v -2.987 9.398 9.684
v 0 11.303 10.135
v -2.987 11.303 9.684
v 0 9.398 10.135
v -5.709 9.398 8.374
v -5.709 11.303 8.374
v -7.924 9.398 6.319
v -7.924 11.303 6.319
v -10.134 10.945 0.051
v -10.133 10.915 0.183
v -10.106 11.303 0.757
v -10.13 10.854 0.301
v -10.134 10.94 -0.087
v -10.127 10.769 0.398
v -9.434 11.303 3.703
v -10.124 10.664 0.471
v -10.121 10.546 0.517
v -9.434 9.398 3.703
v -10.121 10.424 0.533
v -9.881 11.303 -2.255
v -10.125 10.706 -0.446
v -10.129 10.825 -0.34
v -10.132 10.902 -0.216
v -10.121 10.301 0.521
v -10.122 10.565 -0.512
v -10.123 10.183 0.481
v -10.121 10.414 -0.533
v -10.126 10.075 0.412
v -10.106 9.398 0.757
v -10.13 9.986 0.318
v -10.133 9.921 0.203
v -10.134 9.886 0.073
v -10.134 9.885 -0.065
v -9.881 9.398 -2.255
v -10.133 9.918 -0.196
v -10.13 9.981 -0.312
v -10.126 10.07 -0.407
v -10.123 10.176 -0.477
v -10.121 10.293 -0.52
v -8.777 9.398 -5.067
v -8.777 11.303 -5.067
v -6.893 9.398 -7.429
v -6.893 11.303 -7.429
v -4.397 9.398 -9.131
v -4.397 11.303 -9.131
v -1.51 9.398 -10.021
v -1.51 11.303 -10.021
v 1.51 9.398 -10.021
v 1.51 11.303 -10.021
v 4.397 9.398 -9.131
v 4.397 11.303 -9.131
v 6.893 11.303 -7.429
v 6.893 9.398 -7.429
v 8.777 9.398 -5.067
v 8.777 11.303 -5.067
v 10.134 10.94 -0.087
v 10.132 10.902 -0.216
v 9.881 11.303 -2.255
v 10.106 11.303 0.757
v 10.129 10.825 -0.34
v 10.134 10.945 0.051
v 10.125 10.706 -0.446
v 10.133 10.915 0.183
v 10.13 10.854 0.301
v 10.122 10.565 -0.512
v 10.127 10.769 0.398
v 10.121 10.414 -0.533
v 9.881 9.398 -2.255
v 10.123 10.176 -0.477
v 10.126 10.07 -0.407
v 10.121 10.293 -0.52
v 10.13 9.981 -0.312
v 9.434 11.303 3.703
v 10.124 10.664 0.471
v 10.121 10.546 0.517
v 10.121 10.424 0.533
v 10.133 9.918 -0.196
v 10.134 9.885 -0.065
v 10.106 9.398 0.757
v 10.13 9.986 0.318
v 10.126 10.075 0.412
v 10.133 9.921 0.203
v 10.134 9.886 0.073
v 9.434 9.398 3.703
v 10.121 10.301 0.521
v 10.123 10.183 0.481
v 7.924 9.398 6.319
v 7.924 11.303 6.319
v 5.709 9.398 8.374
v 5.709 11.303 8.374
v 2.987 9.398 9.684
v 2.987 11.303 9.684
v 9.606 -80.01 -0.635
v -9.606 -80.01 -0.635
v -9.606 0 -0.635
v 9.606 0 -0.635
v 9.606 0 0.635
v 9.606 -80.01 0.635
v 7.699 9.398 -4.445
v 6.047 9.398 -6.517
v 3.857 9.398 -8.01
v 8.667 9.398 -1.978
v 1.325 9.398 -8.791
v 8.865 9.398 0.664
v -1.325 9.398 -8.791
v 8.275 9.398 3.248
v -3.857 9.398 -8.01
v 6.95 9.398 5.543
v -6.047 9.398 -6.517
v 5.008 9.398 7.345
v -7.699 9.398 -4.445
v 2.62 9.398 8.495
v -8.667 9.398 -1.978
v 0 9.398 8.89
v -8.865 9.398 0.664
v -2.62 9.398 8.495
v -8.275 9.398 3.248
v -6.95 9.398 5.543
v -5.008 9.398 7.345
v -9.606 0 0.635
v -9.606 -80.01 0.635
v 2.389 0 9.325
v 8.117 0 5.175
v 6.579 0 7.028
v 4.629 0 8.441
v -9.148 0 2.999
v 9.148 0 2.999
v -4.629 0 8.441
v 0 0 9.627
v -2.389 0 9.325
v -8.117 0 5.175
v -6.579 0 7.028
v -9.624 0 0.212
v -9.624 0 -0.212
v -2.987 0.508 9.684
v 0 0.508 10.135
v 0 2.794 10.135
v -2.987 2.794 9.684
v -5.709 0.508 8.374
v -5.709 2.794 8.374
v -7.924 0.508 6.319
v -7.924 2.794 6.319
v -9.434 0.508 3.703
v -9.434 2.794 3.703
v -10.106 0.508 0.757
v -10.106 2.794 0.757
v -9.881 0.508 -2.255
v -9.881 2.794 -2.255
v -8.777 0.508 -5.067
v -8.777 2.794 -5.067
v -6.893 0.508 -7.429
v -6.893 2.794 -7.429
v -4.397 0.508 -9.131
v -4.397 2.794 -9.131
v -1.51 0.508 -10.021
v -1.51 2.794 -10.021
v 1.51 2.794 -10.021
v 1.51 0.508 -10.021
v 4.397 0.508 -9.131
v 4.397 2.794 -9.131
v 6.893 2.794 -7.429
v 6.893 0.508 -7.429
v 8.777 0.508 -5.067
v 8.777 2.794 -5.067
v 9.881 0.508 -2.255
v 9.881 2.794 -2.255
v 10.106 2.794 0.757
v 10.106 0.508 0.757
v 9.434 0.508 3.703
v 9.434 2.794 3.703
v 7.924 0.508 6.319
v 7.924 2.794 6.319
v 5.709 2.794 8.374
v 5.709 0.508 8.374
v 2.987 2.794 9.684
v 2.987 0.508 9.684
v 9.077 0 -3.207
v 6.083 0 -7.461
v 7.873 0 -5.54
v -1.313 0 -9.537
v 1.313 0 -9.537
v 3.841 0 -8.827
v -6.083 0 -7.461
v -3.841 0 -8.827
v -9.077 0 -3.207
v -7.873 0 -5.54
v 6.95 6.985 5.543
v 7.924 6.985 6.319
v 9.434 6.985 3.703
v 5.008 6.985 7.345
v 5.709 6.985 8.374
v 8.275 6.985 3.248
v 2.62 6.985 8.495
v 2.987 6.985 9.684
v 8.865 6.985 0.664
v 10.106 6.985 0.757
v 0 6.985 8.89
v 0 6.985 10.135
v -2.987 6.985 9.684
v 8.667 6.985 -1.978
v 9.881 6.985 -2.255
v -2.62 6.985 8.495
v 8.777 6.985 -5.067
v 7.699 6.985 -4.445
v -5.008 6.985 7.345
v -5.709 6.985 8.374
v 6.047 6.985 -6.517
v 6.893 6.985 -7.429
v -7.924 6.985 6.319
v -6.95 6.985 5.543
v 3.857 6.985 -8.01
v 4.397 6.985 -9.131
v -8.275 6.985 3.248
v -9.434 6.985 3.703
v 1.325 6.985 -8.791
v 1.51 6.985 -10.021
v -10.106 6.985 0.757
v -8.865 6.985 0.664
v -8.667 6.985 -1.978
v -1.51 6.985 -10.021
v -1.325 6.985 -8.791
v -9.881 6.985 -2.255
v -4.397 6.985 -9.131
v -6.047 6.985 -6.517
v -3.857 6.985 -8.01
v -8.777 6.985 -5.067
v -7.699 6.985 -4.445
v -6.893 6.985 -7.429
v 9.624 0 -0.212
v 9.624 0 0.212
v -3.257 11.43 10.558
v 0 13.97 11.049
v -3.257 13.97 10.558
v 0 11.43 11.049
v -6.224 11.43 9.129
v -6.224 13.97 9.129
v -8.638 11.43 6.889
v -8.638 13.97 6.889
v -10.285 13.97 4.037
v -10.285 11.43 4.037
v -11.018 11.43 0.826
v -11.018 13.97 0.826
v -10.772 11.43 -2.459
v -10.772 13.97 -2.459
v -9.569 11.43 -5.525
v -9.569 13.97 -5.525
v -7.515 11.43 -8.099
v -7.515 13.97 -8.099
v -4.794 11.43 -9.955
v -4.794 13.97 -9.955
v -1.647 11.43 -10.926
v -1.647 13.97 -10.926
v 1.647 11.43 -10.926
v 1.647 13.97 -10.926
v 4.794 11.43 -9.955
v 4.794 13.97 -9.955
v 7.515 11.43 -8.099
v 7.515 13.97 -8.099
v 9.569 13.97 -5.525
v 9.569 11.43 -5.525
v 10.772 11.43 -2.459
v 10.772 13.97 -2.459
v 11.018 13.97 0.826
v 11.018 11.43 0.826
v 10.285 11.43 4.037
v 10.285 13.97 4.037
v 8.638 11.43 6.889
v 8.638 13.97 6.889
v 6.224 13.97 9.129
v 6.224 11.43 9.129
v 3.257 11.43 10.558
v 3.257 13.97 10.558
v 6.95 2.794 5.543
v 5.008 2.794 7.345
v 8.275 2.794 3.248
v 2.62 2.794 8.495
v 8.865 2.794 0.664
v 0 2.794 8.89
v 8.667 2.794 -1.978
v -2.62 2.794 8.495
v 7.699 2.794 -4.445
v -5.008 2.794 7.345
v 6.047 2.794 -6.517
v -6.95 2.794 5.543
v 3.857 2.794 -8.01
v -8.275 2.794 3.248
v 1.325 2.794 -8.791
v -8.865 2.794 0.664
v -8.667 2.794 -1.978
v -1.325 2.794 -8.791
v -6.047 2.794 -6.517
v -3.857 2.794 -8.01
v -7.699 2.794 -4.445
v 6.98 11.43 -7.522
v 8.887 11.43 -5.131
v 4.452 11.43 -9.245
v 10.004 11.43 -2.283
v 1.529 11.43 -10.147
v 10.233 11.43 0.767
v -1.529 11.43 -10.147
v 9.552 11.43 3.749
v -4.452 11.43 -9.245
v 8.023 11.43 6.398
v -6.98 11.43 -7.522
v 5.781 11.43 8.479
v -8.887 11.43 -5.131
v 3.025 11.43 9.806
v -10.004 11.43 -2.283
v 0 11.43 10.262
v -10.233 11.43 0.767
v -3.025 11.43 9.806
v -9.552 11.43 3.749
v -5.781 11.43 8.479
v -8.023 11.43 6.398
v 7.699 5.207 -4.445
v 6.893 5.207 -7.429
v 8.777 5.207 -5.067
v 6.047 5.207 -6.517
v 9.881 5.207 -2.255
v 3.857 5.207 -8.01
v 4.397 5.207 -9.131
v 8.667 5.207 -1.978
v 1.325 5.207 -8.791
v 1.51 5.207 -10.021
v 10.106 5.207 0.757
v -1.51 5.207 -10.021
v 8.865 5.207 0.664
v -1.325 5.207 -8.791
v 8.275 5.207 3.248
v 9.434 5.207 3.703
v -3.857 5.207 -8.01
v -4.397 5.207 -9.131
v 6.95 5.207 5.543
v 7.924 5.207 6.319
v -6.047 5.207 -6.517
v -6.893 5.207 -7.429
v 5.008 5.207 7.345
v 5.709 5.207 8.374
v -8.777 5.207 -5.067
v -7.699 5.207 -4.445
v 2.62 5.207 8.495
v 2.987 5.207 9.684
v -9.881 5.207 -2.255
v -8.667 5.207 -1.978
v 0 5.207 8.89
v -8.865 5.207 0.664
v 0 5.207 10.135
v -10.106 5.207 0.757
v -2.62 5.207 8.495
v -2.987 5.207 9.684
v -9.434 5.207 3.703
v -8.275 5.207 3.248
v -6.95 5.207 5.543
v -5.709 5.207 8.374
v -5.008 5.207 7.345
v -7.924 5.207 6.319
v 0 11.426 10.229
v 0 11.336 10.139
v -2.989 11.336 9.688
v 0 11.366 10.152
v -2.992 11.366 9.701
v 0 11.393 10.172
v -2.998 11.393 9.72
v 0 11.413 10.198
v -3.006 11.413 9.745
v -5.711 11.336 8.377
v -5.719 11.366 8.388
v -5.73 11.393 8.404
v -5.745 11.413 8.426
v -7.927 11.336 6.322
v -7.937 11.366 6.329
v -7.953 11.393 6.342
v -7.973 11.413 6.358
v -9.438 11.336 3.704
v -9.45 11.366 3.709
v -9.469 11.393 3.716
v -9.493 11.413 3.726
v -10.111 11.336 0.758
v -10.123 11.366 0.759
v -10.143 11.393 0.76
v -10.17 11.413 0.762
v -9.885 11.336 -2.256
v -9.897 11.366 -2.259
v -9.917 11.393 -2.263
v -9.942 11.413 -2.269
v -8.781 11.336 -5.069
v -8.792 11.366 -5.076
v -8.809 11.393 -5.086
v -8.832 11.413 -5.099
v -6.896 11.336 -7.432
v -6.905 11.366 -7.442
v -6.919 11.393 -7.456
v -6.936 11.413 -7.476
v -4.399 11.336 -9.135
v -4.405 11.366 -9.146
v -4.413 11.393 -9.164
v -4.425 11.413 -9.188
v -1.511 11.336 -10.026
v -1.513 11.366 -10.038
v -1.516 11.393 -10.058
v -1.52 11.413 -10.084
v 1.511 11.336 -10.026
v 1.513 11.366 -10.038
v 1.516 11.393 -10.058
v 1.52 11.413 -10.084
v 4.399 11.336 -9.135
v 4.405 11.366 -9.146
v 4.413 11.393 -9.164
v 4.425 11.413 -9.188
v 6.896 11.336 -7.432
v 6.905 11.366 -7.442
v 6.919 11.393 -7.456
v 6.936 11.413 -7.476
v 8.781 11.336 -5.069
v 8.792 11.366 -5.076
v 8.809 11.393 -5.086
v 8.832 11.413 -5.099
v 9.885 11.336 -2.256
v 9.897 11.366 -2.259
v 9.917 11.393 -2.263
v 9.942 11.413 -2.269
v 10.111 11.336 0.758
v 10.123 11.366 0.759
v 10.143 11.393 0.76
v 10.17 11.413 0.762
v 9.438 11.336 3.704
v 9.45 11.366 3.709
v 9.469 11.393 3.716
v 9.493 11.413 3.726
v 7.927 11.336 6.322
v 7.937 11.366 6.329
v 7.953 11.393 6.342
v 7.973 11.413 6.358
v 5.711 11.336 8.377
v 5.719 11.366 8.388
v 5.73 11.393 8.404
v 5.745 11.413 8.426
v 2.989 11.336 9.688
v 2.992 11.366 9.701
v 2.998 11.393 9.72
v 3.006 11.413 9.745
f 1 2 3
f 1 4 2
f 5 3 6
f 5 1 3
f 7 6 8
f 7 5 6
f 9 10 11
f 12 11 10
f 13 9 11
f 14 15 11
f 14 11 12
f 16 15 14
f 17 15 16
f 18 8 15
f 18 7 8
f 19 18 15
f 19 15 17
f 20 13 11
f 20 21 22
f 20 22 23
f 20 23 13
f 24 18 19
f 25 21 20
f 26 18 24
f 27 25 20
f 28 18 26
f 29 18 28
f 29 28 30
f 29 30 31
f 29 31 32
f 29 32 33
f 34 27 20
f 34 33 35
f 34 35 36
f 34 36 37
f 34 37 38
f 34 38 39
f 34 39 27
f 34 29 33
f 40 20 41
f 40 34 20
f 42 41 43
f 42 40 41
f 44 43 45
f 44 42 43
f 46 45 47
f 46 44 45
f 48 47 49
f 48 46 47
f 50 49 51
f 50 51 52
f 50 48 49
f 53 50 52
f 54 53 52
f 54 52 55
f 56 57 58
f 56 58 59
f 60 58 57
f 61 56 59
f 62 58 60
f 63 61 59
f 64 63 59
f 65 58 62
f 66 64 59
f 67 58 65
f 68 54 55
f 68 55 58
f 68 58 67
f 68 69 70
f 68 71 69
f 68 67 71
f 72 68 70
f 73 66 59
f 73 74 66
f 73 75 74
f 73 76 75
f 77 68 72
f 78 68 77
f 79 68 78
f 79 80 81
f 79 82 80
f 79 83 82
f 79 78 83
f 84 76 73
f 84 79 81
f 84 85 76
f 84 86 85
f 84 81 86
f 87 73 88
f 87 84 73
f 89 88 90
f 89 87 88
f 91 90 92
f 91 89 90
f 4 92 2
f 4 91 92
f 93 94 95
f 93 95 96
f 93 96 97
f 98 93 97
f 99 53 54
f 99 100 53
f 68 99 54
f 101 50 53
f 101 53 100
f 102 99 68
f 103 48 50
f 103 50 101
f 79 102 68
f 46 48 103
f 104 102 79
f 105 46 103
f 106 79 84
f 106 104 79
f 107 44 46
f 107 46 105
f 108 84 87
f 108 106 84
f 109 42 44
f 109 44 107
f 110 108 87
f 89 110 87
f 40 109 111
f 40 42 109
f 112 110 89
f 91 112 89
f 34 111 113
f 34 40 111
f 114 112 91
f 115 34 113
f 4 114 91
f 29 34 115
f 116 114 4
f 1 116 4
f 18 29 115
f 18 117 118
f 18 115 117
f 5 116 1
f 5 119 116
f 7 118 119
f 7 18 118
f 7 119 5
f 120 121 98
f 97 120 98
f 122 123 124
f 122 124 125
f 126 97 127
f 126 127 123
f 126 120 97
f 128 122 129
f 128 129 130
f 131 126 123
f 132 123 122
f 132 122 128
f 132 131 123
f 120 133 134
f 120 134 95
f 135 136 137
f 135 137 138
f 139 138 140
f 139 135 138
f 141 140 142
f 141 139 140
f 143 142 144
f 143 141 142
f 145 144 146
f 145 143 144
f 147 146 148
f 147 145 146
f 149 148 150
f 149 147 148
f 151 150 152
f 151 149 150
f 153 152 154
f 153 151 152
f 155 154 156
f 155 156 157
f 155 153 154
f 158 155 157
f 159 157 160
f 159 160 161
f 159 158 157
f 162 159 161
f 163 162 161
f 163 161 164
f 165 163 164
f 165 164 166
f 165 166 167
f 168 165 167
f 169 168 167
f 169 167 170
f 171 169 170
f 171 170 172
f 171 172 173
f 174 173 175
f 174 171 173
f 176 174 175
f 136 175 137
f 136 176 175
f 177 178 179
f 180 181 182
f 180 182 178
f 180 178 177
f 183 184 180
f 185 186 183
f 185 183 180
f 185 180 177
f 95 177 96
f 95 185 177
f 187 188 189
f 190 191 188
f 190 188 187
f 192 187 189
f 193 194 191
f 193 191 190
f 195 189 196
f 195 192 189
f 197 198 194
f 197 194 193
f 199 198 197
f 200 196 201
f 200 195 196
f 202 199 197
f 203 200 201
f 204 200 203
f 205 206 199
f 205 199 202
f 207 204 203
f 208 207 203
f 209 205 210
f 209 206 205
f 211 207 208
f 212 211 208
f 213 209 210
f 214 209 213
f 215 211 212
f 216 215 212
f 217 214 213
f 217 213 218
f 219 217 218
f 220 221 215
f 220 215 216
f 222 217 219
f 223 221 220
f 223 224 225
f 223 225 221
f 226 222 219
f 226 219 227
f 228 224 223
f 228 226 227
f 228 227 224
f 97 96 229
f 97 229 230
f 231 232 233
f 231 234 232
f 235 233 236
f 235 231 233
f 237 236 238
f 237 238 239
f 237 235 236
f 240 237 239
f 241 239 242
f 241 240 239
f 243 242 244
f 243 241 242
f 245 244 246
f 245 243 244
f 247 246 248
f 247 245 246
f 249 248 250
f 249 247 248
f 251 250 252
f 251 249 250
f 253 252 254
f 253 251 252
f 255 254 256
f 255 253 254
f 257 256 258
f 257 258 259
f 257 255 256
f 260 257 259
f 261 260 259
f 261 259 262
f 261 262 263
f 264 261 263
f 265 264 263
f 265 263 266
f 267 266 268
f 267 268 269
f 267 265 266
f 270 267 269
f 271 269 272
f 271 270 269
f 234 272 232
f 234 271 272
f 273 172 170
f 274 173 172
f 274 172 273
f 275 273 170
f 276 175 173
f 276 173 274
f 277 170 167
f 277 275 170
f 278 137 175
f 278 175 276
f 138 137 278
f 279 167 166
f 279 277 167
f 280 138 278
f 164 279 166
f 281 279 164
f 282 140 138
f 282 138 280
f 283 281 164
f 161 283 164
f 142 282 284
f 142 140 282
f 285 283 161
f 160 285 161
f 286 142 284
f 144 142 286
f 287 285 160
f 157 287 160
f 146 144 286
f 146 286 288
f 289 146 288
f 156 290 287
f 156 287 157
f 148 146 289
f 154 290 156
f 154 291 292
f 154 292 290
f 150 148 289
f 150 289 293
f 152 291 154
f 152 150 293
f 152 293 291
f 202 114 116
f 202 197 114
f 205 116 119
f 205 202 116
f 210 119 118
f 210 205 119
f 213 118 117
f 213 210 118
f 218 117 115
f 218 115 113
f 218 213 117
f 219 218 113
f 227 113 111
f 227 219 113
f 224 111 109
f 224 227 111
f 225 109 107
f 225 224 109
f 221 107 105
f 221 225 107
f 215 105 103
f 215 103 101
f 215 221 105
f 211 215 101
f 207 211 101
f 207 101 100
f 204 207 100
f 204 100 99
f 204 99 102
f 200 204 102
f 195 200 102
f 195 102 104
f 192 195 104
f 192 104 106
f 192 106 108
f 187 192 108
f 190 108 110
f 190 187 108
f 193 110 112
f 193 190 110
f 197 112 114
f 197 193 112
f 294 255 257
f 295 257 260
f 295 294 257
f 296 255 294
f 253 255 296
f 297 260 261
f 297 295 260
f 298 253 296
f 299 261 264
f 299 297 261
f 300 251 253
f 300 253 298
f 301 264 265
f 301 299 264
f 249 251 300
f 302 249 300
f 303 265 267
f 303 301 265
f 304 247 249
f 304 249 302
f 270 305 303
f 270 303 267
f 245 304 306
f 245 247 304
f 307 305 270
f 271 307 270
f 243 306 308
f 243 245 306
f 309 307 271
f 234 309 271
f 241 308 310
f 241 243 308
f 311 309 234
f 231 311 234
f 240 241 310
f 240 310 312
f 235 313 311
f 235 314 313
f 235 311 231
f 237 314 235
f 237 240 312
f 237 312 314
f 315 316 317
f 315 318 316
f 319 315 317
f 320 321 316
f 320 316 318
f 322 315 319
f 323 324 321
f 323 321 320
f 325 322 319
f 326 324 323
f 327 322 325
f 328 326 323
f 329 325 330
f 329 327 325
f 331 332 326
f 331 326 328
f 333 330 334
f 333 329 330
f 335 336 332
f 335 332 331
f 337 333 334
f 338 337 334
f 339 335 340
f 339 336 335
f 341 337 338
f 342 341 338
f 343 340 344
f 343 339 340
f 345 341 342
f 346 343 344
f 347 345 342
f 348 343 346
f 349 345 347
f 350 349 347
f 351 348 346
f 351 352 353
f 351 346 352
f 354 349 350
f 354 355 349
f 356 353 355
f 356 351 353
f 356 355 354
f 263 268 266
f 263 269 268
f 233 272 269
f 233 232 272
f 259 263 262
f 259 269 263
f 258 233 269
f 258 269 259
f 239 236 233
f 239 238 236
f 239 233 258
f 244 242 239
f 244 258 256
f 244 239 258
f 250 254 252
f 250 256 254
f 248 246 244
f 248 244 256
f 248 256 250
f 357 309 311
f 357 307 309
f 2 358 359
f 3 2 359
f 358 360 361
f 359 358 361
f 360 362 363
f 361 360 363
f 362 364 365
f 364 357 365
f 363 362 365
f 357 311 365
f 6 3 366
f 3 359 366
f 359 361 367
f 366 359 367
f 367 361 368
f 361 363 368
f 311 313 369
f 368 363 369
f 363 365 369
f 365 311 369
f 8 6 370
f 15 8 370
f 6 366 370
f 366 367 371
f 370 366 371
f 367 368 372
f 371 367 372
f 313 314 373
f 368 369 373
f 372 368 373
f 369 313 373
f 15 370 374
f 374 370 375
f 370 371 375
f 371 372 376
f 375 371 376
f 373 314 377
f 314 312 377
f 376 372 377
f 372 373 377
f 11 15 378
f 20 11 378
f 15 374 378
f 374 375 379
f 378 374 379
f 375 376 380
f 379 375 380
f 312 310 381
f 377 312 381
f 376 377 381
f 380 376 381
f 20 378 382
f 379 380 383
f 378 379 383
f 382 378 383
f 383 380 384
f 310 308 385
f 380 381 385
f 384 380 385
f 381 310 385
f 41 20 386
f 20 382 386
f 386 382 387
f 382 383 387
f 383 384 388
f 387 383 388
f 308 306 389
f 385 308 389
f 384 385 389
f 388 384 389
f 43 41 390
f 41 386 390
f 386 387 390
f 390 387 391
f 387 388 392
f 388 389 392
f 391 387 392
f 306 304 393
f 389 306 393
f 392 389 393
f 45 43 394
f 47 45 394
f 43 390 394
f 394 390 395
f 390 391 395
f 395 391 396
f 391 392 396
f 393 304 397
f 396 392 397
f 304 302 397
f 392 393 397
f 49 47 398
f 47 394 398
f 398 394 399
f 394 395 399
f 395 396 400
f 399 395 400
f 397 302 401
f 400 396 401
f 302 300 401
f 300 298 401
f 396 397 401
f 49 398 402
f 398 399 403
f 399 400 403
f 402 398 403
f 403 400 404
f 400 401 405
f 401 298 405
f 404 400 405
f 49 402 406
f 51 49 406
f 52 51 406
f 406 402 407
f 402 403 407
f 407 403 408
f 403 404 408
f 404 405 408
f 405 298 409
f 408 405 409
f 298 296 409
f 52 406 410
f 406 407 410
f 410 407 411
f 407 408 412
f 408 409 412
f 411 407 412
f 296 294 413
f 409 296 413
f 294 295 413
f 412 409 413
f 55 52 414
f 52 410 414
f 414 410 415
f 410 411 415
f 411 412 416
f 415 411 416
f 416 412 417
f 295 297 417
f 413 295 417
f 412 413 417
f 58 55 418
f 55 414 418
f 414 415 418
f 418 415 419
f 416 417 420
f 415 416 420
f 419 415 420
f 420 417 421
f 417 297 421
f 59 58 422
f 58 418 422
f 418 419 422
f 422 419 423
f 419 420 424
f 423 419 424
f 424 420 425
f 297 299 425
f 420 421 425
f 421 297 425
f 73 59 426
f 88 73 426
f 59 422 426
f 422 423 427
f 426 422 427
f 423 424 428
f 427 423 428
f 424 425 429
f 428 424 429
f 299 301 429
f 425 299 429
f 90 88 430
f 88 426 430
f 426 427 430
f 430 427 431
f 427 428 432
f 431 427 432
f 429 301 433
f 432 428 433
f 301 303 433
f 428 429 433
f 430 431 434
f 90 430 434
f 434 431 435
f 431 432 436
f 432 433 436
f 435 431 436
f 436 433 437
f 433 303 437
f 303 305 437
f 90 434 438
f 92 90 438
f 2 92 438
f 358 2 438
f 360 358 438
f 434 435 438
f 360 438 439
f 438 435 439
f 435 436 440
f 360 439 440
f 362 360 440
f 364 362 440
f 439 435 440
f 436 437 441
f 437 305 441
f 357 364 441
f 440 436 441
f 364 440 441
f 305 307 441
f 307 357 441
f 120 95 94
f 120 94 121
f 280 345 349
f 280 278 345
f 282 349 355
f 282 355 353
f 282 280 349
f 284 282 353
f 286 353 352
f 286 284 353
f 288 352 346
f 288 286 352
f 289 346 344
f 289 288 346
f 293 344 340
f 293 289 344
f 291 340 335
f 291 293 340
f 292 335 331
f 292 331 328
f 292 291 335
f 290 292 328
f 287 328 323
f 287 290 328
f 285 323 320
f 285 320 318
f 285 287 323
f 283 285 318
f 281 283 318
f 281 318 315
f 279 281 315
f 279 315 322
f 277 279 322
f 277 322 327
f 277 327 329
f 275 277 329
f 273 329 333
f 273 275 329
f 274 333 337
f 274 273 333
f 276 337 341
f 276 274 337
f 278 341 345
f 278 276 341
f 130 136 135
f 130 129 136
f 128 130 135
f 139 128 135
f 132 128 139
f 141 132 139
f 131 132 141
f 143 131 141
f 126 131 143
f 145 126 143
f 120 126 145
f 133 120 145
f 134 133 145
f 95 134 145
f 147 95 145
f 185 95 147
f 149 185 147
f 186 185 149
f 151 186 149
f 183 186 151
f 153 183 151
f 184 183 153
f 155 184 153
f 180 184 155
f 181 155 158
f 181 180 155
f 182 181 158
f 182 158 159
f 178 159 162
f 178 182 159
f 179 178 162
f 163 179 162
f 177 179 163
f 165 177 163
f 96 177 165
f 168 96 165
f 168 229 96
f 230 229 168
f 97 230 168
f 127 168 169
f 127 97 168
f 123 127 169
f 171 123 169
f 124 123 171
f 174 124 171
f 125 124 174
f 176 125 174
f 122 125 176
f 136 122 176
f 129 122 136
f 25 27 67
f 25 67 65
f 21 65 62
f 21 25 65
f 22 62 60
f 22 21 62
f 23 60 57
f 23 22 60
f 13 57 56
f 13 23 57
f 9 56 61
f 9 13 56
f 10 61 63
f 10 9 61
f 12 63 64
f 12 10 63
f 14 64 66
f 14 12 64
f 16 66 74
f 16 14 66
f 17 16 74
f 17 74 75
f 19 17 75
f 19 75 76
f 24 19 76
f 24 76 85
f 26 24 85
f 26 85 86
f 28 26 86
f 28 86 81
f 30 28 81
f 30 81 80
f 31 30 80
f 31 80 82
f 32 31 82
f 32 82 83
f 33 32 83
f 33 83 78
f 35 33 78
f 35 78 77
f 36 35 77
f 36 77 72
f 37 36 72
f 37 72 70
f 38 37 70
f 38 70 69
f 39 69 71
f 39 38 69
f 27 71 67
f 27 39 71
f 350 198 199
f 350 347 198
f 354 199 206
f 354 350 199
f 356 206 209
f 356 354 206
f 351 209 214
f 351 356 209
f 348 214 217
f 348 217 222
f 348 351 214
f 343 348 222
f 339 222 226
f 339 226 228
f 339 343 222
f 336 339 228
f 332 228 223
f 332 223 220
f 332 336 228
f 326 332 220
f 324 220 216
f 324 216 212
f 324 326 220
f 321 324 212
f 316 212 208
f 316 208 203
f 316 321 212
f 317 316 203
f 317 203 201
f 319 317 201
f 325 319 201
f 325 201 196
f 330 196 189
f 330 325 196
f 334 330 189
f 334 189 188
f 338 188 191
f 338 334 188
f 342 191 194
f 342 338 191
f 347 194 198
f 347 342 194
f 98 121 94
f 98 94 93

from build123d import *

# Parameters (mm, degrees)
CHAMFER1_SIZE           = 0.508
SKETCH2_W               = 19.211267794
SKETCH2_H               = 1.27
BOSS_EXTRUDE1_DEPTH     = 80.01
FILLET1_R               = 0.127
CUT_EXTRUDE1_DEPTH      = 82.521536431
CUT_EXTRUDE1_DEPTH_BACK = 82.521536431
SKETCH3_R               = 0.5334


with BuildPart() as part:
    # Sketch1 → Revolve1 (revolve)
    with BuildSketch(Plane.XY, mode=Mode.PRIVATE) as revolve1_sk:
        Polygon((0, 13.97), (-11.049, 13.97), (-11.049, 11.43), (-10.1346, 11.43), (-10.1346, 9.398), (-8.89, 9.398), (-8.89, 6.985), (-10.1346, 6.985), (-10.1346, 5.207), (-8.89, 5.207), (-8.89, 2.794), (-10.1346, 2.794), (-10.1346, 0), (0, 0), align=None)
    revolve(revolve1_sk.sketch.rotate(Axis((0, 20.368840099, 0), (0, -1, 0)), 270), axis=Axis((0, 20.368840099, 0), (0, -1, 0)))

    # Chamfer1
    chamfer1_edges = [part.edges().sort_by_distance(p)[0] for p in [
        (0, 0, -10.1346),
    ]]
    chamfer(chamfer1_edges, length=CHAMFER1_SIZE)

    # Sketch2 → Boss-Extrude1 (add)
    with BuildSketch(Plane.XZ):
        Rectangle(SKETCH2_W, SKETCH2_H)
    extrude(amount=BOSS_EXTRUDE1_DEPTH)

    # Fillet1
    fillet1_edges = [part.edges().sort_by_distance(p)[0] for p in [
        (0, 11.43, -10.1346),
    ]]
    fillet(fillet1_edges, radius=FILLET1_R)

    # Sketch3 → Cut-Extrude1 (cut, two sides: drawn at the far end of the back side and taken through both)
    with BuildSketch(Plane(origin=(0, 0, 0), x_dir=(0, 0, -1), z_dir=(1, 0, 0)).offset(-CUT_EXTRUDE1_DEPTH_BACK)):
        with Locations((0, 10.414)):
            Circle(SKETCH3_R)
    extrude(amount=CUT_EXTRUDE1_DEPTH + CUT_EXTRUDE1_DEPTH_BACK, mode=Mode.SUBTRACT)


solid = part.part
